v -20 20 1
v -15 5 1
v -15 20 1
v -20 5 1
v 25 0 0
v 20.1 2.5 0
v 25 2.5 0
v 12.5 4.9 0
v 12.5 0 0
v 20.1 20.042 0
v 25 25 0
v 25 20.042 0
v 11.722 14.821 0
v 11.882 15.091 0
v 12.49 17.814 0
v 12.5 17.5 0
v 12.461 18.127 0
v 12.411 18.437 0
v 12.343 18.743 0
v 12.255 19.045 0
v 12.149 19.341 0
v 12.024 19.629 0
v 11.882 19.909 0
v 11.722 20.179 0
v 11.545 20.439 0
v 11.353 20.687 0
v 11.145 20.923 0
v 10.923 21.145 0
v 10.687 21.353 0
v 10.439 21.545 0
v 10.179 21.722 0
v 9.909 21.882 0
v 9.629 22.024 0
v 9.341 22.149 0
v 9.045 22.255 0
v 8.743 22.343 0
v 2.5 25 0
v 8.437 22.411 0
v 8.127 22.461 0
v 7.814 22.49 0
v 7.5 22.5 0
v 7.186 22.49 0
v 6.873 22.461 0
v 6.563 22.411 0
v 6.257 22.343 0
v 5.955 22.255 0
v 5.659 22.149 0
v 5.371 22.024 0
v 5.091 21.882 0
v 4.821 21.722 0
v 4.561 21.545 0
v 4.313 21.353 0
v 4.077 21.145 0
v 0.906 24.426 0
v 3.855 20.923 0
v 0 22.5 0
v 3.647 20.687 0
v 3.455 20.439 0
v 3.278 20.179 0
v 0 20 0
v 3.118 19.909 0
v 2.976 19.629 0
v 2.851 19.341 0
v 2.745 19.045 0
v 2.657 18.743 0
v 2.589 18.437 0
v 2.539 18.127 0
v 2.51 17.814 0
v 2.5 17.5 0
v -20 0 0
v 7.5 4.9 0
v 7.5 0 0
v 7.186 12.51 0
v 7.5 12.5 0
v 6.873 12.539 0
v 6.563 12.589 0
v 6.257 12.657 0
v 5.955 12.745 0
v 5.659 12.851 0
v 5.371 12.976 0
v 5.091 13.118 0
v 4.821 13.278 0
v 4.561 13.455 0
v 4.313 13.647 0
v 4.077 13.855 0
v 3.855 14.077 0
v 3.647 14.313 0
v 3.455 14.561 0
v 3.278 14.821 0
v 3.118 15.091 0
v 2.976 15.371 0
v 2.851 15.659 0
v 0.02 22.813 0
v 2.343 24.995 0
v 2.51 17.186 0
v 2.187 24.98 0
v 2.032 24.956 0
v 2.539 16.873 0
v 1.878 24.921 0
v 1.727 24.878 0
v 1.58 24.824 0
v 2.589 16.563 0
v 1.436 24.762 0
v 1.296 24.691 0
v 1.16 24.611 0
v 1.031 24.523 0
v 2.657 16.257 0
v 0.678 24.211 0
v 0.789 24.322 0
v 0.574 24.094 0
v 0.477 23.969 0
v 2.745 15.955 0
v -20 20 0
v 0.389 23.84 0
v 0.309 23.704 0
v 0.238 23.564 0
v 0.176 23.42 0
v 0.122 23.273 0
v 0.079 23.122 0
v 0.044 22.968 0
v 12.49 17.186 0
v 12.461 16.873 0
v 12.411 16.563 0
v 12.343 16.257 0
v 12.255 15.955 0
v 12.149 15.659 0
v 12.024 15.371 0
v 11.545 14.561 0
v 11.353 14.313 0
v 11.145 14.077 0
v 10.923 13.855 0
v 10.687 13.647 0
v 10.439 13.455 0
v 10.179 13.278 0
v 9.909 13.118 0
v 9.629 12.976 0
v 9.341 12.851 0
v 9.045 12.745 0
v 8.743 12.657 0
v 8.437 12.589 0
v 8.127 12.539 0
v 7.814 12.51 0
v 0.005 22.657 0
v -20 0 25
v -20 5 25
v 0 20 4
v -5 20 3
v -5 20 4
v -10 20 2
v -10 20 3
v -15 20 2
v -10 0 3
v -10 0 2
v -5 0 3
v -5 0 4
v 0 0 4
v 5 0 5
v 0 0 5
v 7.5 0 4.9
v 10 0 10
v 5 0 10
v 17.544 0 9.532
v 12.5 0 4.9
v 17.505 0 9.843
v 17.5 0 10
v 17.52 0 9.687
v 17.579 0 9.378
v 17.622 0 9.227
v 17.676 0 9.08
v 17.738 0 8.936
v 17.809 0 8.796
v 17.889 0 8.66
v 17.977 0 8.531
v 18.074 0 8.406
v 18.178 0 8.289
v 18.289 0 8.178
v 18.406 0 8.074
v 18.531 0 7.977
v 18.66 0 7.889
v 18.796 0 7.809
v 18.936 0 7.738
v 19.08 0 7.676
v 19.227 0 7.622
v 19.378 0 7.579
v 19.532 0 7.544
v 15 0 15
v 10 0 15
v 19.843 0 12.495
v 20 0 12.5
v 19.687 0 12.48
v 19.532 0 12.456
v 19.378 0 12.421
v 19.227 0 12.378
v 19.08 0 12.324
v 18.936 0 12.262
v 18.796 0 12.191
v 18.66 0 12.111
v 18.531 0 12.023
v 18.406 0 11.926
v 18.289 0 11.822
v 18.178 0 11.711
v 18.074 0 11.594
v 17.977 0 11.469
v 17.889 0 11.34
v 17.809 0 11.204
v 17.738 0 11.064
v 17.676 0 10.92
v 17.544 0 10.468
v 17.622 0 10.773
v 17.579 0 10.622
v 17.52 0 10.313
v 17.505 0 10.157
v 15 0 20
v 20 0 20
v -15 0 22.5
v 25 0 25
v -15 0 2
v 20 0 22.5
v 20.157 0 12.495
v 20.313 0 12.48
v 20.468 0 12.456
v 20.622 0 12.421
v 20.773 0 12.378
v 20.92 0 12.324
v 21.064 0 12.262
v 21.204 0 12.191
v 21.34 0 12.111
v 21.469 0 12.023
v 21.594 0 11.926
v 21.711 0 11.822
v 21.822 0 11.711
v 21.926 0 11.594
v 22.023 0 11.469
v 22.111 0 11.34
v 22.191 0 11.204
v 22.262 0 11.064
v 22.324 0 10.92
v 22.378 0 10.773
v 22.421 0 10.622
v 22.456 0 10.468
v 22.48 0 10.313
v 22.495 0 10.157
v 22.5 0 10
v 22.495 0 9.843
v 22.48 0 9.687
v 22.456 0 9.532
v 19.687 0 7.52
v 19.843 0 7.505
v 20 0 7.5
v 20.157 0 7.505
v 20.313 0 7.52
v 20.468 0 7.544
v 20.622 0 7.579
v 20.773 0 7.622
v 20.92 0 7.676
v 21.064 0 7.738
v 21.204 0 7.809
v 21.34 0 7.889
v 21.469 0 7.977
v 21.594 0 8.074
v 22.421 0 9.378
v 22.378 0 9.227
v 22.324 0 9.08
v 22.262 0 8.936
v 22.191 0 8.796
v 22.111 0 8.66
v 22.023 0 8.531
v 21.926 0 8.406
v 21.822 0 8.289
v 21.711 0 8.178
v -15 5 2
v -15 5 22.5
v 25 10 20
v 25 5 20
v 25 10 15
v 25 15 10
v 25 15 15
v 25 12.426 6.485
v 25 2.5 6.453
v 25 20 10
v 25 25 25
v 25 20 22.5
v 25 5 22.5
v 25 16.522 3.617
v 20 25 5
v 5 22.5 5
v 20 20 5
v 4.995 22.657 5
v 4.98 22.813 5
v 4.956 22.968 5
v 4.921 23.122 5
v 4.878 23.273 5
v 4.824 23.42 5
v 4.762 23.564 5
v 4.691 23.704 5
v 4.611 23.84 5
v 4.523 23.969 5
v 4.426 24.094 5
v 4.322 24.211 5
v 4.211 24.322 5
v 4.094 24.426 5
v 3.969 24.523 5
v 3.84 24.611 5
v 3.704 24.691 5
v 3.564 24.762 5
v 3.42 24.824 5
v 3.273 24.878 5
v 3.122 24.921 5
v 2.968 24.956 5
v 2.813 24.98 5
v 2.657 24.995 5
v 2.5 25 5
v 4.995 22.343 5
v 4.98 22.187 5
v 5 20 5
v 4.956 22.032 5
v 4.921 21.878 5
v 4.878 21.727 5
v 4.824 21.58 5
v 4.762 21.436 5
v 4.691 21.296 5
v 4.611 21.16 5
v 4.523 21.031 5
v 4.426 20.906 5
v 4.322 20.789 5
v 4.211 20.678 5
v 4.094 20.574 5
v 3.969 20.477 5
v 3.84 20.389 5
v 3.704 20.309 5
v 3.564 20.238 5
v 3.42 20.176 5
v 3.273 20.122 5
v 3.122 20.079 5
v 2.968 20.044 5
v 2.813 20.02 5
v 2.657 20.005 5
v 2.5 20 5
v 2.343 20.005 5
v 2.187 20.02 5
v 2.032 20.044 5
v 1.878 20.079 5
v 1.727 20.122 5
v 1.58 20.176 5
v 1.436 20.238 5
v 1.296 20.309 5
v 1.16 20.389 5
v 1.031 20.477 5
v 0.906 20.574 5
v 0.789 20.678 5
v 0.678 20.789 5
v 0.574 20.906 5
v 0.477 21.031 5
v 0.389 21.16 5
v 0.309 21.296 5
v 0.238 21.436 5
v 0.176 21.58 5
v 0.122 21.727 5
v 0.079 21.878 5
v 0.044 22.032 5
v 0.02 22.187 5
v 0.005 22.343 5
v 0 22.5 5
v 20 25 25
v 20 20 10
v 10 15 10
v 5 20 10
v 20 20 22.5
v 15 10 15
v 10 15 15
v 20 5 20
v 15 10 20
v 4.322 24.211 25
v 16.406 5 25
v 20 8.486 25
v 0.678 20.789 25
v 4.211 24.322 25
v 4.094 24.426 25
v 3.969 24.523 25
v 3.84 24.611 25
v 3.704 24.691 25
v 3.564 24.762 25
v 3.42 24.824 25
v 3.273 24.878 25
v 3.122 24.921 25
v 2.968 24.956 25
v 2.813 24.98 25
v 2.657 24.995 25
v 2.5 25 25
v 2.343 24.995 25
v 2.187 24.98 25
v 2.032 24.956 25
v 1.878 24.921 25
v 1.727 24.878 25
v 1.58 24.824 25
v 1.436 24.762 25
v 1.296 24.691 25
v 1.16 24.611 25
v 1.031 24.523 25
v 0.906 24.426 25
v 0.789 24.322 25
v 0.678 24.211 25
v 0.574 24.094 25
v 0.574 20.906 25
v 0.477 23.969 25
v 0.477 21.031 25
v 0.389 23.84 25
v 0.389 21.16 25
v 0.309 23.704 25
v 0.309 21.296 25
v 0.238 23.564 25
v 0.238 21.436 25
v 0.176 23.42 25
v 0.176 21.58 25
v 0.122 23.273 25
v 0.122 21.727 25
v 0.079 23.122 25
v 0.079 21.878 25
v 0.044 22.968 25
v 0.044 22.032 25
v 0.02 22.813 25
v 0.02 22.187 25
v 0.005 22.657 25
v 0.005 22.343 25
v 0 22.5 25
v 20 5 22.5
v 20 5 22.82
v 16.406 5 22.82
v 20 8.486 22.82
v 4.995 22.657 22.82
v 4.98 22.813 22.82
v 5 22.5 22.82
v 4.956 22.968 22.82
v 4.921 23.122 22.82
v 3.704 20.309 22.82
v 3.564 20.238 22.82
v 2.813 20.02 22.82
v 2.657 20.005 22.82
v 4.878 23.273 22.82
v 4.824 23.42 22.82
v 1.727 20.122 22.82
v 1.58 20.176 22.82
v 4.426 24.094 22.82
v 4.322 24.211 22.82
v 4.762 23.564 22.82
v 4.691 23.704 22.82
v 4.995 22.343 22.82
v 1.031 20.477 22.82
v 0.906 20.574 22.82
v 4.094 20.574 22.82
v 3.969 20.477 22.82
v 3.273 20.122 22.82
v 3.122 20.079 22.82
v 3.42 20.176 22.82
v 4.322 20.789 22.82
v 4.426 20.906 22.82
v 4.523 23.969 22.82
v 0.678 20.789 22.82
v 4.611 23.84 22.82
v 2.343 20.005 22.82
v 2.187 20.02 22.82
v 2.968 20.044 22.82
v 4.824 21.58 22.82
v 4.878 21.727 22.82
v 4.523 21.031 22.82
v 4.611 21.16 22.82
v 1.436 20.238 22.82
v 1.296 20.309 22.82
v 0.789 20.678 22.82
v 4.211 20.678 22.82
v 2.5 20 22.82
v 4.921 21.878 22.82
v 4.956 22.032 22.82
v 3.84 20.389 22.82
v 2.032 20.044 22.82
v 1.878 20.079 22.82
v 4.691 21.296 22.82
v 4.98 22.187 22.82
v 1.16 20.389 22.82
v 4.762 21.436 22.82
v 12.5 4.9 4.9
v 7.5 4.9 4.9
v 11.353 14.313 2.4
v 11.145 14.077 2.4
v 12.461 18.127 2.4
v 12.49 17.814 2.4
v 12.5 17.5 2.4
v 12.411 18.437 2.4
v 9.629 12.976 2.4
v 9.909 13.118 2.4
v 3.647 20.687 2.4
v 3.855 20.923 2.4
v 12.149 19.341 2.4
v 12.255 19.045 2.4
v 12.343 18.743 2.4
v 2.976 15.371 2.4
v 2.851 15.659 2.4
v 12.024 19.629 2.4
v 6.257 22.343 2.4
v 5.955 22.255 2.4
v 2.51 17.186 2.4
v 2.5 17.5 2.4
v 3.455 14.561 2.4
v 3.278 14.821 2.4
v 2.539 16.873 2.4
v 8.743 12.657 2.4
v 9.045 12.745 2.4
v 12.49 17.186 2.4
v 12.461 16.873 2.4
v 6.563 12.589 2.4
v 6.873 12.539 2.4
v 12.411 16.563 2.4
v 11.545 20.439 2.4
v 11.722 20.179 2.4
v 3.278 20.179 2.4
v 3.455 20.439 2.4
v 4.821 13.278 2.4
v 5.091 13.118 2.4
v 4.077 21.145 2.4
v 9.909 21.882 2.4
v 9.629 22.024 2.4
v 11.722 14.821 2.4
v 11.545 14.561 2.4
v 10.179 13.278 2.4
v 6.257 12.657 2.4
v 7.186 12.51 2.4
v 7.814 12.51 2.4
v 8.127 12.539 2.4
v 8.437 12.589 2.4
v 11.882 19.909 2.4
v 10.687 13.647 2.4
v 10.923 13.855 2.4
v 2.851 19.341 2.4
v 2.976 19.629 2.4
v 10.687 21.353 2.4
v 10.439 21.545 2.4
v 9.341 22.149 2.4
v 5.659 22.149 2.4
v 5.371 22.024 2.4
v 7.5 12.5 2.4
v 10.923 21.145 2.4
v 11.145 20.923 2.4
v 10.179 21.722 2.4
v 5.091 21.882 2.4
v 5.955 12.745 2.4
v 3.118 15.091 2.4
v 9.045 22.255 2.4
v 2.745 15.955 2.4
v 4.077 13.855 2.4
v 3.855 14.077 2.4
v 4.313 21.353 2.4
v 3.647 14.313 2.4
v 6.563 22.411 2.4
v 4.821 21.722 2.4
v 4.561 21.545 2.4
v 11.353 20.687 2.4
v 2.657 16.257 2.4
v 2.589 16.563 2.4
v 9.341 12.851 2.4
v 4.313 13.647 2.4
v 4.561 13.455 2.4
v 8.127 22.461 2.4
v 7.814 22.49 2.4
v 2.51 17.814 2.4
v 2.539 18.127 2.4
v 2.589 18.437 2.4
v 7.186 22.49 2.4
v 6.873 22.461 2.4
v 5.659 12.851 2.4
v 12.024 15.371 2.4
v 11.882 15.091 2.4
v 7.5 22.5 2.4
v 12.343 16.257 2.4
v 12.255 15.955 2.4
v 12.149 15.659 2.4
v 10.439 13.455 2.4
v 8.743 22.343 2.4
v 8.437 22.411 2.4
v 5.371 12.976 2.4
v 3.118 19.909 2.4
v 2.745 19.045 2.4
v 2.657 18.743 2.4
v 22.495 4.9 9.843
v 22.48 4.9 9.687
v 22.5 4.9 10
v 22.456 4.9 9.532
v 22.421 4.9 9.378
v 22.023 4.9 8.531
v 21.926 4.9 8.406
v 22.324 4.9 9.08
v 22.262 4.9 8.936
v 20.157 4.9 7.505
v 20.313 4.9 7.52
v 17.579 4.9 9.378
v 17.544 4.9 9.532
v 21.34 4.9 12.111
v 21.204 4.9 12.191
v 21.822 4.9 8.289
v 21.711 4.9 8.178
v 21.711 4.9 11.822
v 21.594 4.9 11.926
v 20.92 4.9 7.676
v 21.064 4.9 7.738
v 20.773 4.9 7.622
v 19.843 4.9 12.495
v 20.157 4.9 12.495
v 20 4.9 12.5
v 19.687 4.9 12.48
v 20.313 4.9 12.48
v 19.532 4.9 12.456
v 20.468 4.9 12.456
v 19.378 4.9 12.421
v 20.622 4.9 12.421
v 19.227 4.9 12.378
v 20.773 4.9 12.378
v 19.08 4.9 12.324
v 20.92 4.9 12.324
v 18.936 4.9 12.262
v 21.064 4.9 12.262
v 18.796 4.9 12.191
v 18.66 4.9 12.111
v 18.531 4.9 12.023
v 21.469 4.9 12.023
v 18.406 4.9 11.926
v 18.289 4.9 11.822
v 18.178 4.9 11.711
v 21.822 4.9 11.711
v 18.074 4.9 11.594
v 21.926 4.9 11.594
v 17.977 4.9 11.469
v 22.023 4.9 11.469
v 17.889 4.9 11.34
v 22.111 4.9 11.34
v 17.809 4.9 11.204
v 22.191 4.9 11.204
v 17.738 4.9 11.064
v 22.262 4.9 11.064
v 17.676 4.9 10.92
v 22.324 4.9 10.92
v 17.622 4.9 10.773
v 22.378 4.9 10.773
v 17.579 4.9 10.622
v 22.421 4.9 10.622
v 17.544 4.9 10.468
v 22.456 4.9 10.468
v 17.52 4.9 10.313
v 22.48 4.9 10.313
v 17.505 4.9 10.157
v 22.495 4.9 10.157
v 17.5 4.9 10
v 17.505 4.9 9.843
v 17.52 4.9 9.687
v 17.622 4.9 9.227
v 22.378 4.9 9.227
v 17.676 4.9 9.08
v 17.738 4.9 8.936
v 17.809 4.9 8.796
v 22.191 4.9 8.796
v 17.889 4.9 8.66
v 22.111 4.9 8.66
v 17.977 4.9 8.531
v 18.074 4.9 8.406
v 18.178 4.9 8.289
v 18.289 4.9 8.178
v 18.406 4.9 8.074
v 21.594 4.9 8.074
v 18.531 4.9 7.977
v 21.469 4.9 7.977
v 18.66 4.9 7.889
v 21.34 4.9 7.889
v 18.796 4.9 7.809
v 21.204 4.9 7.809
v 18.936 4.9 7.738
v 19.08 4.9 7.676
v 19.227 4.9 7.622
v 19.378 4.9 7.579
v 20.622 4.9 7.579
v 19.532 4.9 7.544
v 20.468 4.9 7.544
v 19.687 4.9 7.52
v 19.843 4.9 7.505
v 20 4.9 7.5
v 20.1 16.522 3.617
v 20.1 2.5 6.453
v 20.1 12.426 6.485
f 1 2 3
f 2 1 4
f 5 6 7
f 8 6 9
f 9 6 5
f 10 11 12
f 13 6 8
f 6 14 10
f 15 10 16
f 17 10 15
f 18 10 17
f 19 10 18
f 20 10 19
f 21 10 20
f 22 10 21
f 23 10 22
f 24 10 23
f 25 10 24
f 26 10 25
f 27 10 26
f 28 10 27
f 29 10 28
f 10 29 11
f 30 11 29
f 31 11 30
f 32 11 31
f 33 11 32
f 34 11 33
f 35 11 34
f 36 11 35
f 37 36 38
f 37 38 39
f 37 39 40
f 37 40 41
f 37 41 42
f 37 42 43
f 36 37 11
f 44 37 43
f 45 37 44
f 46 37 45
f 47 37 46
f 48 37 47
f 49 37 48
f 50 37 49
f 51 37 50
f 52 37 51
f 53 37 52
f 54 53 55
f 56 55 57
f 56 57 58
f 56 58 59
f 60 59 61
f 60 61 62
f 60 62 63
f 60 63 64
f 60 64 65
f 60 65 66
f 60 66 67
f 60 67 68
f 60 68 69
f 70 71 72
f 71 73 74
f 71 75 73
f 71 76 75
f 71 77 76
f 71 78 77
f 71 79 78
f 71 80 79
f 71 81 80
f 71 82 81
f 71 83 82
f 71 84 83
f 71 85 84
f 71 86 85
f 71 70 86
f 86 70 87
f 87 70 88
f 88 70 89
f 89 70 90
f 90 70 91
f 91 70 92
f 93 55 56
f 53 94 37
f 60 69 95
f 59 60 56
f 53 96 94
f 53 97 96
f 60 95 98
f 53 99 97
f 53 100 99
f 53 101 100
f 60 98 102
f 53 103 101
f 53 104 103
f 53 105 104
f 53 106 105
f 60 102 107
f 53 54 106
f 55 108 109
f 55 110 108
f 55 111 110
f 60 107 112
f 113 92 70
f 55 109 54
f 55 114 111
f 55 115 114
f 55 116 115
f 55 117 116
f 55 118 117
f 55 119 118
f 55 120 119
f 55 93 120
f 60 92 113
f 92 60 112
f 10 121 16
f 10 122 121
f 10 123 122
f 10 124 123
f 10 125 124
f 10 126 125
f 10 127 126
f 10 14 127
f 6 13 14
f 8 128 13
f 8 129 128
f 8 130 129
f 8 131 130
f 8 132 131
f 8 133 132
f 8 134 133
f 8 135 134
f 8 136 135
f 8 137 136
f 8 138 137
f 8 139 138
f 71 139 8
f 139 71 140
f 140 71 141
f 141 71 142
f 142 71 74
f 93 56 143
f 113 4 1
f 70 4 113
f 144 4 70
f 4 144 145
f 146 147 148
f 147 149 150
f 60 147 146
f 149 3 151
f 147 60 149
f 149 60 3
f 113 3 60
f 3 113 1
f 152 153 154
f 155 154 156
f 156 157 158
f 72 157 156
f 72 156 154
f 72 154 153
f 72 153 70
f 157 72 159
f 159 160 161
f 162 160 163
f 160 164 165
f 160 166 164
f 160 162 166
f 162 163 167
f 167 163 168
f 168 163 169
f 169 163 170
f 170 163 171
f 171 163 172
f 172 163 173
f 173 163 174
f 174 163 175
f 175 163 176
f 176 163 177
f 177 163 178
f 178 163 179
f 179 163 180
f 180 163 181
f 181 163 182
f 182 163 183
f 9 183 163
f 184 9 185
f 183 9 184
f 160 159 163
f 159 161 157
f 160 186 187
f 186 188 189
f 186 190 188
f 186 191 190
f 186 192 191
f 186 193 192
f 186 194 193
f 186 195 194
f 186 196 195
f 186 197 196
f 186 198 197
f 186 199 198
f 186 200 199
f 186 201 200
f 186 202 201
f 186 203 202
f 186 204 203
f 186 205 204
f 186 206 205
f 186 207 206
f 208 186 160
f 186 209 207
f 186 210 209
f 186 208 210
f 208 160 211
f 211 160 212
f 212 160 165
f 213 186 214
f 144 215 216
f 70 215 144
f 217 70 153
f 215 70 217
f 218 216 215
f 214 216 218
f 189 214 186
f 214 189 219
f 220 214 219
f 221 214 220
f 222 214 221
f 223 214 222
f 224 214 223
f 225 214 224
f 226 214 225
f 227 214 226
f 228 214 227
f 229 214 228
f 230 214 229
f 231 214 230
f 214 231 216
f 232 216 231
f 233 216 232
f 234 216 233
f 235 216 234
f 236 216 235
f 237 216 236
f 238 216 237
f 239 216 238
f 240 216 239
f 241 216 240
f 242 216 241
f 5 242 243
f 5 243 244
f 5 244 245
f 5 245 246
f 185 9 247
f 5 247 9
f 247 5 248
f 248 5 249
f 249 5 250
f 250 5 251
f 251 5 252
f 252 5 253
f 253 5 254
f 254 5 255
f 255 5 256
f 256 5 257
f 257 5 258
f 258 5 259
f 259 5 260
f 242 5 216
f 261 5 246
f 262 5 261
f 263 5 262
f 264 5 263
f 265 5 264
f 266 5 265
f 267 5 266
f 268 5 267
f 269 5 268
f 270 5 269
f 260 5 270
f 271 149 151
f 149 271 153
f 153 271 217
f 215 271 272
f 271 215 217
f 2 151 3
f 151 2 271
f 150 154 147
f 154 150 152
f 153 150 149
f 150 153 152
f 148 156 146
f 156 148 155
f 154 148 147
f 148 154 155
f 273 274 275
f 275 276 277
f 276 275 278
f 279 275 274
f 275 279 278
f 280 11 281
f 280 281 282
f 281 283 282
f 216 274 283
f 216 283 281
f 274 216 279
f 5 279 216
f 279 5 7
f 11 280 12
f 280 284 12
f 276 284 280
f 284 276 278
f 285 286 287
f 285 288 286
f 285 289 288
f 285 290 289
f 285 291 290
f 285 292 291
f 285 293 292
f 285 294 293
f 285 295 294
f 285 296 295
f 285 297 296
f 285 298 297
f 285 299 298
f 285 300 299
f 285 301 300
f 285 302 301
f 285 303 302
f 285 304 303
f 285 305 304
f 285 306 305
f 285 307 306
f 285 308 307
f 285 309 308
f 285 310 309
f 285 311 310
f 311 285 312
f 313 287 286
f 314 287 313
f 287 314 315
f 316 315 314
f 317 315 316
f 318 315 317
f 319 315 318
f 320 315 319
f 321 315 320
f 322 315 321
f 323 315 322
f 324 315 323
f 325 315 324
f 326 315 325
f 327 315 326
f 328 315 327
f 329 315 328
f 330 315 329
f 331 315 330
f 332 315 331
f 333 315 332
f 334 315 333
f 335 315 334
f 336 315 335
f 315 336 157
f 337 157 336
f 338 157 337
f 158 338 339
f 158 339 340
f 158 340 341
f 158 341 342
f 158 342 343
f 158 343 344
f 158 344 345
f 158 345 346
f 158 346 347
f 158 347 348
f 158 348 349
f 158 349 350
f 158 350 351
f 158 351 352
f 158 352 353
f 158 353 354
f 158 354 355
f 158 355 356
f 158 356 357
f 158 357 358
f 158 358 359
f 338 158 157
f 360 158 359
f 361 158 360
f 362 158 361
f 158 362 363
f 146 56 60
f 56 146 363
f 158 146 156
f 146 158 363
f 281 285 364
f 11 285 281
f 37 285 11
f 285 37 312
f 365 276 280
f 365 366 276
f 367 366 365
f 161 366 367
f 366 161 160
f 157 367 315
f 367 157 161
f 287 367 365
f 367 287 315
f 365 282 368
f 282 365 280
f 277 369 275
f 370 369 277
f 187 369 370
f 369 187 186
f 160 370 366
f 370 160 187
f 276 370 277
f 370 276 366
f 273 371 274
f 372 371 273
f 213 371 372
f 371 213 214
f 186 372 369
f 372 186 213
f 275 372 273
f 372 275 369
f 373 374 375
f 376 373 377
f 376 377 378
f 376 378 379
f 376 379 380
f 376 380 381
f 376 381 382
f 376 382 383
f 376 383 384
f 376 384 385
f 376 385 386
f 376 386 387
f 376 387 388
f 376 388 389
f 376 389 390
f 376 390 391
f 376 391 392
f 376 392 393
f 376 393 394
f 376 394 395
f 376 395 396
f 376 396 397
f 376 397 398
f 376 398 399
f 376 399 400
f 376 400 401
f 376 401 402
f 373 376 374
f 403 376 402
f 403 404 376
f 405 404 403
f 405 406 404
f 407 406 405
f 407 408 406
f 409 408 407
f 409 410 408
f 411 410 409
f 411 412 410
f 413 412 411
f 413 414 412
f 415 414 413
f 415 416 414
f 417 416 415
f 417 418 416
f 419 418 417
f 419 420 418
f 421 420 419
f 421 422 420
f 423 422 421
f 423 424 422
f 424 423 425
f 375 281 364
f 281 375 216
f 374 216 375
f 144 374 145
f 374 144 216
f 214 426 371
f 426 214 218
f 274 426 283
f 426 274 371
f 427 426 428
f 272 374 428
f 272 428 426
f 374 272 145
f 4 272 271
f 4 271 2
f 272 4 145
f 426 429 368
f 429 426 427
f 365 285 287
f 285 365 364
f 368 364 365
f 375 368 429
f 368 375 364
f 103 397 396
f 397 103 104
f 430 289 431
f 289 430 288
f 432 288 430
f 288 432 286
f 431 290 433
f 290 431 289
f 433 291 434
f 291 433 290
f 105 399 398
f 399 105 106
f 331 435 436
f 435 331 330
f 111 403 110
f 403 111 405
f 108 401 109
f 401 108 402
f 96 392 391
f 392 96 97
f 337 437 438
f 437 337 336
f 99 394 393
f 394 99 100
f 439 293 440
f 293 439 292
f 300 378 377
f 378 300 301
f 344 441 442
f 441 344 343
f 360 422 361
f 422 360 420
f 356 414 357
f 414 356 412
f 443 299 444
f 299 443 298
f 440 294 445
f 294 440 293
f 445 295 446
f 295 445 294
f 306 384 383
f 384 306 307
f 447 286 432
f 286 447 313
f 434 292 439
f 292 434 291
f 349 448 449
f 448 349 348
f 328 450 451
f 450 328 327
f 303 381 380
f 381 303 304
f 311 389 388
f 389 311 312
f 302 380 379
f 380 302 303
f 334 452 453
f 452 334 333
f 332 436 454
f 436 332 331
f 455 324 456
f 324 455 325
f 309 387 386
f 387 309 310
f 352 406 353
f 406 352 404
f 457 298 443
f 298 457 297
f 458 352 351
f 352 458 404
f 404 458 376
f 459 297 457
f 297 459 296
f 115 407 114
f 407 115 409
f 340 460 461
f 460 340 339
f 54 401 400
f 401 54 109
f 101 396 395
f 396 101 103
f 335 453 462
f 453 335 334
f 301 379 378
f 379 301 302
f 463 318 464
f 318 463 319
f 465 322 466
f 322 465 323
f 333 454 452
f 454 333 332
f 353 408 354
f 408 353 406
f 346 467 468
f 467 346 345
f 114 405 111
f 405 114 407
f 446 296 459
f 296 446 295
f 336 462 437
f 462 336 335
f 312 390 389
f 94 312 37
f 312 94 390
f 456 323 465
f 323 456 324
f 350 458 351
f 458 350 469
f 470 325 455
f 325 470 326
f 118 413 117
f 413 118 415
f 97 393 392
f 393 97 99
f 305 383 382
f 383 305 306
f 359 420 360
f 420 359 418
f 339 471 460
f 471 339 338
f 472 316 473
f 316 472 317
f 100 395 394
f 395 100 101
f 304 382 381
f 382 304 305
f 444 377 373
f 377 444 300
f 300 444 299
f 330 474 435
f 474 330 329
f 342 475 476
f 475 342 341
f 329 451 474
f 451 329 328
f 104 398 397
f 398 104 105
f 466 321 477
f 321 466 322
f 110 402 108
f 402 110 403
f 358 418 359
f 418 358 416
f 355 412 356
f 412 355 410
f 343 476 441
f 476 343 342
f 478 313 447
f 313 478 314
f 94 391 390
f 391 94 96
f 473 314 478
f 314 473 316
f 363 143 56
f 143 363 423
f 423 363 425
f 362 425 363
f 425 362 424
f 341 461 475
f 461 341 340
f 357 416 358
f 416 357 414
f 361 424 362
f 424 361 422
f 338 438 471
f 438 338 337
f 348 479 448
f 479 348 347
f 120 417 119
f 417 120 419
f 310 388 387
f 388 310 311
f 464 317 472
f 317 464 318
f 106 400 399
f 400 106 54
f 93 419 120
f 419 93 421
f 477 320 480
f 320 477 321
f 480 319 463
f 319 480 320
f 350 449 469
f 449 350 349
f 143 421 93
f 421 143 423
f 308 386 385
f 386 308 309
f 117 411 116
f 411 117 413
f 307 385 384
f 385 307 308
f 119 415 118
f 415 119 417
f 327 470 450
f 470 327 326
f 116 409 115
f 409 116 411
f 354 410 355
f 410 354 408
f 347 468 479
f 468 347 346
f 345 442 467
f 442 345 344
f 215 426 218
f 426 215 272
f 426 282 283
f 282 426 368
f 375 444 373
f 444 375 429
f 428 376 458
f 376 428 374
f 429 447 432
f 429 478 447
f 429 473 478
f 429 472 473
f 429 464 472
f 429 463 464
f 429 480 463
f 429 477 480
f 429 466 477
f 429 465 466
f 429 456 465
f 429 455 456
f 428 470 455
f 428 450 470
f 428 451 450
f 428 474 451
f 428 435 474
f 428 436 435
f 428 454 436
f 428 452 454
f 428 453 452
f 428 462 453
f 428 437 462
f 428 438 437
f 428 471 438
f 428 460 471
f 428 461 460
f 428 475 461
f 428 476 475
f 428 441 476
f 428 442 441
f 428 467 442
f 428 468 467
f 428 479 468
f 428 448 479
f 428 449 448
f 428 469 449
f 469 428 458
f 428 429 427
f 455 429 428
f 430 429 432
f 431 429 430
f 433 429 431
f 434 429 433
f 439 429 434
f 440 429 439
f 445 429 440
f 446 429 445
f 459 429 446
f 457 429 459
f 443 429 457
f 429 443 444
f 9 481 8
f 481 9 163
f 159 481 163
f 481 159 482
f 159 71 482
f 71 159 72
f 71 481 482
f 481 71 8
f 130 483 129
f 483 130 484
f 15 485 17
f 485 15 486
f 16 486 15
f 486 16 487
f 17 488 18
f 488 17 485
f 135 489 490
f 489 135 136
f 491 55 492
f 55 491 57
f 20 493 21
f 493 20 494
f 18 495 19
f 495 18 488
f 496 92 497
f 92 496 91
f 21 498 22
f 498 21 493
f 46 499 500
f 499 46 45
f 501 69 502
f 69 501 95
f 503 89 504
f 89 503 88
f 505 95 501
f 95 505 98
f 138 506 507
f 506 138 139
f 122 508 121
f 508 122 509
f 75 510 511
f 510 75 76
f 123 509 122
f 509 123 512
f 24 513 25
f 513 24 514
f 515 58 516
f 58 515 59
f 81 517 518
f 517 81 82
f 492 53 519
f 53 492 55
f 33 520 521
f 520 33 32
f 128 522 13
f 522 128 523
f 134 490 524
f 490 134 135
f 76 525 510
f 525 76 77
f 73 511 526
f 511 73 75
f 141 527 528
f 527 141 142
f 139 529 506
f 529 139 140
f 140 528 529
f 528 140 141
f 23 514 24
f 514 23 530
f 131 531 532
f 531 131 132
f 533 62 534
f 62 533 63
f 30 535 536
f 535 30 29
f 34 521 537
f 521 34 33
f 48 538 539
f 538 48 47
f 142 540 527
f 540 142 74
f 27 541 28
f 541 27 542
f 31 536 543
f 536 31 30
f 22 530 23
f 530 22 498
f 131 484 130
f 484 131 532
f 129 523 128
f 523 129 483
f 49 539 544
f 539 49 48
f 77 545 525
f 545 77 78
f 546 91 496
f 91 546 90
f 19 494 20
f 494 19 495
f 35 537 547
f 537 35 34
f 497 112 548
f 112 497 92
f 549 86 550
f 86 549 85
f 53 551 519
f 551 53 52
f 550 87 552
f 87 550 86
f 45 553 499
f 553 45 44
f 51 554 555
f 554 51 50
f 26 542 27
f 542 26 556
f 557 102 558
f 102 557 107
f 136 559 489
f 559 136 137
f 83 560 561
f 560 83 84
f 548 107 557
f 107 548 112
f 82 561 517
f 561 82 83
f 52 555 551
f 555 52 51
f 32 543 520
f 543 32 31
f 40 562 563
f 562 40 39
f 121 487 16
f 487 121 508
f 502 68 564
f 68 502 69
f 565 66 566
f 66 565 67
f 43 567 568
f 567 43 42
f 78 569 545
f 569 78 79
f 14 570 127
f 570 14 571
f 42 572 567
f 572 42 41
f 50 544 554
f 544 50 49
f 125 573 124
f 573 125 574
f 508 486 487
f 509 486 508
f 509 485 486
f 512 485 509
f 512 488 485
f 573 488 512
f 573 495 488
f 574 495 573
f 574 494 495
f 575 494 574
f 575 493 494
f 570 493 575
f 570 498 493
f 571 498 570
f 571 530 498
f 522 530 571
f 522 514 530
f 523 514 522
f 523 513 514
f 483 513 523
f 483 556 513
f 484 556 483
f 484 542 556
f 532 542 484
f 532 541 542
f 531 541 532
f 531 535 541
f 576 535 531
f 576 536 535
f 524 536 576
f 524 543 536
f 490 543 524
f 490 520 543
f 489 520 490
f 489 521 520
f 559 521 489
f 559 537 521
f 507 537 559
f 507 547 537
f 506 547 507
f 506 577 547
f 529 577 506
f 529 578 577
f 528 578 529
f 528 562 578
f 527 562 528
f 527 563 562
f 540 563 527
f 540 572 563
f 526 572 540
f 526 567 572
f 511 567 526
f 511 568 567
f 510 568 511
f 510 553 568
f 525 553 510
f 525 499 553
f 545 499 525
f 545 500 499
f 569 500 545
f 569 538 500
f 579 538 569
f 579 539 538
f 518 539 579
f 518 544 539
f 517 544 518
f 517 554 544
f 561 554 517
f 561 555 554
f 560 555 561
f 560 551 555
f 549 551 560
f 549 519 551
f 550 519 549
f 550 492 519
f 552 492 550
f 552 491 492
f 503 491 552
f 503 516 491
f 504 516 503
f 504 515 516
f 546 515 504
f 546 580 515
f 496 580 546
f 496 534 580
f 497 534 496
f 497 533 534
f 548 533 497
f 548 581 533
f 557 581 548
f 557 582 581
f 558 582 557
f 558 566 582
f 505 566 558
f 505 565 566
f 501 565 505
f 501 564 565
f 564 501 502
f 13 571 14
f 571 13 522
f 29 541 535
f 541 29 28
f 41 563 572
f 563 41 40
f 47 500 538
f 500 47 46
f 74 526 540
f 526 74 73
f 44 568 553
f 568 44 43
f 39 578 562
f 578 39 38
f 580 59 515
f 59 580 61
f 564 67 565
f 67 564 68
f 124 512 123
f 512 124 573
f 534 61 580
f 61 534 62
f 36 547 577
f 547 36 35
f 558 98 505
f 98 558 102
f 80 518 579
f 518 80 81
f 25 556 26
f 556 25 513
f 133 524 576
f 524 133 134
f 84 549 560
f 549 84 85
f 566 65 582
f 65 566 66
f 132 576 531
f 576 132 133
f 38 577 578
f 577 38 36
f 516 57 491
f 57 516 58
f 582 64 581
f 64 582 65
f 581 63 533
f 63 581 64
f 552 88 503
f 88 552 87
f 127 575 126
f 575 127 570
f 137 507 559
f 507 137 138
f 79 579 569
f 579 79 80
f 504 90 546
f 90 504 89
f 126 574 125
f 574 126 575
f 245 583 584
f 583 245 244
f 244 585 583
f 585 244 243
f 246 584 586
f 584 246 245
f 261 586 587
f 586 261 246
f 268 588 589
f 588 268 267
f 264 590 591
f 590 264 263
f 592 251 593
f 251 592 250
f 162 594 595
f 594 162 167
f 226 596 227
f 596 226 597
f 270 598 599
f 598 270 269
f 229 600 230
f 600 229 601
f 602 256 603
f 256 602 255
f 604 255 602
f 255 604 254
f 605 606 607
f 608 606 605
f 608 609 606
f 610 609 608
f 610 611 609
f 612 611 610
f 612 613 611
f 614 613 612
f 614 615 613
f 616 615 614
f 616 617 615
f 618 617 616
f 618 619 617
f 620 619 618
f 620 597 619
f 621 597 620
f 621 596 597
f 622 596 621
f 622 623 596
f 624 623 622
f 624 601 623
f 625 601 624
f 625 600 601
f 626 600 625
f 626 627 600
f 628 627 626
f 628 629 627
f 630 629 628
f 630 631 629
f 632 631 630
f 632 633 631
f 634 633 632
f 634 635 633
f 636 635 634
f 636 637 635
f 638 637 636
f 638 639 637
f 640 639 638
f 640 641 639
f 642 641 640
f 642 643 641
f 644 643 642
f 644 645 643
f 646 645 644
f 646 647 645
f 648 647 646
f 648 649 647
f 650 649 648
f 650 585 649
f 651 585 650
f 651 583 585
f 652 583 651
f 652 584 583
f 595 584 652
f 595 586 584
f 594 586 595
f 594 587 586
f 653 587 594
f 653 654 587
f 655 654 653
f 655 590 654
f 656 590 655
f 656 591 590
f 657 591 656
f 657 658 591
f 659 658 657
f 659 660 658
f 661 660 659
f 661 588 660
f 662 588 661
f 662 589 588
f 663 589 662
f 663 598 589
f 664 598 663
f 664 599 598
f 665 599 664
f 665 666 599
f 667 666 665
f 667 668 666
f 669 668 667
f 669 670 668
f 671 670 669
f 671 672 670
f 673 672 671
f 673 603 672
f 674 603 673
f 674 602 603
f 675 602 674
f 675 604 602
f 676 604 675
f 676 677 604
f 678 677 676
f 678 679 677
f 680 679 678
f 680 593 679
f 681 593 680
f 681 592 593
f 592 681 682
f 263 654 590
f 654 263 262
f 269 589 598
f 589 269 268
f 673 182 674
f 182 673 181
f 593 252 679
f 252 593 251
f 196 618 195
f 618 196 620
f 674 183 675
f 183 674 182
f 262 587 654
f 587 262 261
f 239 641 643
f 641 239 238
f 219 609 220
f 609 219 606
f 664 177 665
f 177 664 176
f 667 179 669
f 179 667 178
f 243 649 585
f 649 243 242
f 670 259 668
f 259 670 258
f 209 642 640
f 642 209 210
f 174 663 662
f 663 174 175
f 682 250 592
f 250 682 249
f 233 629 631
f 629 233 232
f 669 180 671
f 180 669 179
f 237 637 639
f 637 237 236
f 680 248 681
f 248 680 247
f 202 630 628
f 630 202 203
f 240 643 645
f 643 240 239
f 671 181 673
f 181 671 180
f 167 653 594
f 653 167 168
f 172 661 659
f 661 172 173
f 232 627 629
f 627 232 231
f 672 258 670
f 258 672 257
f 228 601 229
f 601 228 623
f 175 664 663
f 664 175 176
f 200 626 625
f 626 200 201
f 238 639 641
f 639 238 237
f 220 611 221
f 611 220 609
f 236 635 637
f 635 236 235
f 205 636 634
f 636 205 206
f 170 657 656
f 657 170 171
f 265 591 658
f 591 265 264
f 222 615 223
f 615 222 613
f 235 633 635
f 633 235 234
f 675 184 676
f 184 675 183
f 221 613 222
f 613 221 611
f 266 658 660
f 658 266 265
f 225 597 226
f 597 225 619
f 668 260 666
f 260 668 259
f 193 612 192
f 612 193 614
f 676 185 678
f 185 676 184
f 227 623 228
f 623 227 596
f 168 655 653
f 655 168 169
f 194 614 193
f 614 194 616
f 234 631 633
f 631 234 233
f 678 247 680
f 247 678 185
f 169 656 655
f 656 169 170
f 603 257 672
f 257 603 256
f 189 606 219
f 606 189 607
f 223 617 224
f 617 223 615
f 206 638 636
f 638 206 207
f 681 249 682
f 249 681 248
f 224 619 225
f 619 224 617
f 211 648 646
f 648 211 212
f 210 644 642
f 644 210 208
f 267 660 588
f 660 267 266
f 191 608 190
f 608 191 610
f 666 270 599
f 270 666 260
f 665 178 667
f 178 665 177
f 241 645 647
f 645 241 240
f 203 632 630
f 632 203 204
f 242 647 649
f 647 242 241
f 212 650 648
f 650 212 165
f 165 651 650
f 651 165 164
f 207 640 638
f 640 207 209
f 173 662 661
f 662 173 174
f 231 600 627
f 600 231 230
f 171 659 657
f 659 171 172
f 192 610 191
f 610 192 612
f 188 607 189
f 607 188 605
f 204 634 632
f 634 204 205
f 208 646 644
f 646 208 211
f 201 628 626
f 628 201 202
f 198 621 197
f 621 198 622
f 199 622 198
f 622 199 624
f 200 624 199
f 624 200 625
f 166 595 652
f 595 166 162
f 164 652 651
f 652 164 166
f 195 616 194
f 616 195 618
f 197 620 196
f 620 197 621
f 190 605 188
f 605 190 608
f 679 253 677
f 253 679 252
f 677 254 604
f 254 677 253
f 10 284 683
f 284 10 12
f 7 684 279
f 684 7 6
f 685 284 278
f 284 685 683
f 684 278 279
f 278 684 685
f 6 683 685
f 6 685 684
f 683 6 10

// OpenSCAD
$fn=100;

size=25;
numsteps=5;
step=size/numsteps;
line_height=0.32;
echo(step);

step_cube();

module step_cube(){
    difference(){
        union(){
            //steps
            for(i=[1:numsteps-1]){
                translate([-size+step*i,0,0])
                cube([size,size-step,i]);
            }
    
            difference(){
            for(i=[0:numsteps-1]){
                translate([step*i,0,0]) cube([size-step*i,size-step*i,step*(i+1)]);
            }
            
        translate([-step/2,size-step,-.1]) rotate([0,0,45]) 
        cube([step*2,step,step+1]);
            }
        
            // polls
            translate([-size+step,0,0])
            cube([step,step,size]);
            translate([size-step,size-step,0]) cube([step,step,size]);
            translate([step/2,size-step/2,0]) cylinder(d=step, h=size);
            
            // bridges
            translate([-size+step,0,size-step/2]) cube([size*2-step,step,step/2]);
            translate([size-step,0,size-step/2]) cube([step,size,step/2]);
            hull(){
                translate([size-step+1.4,0,size-step/2+line_height]) 
                rotate([0,0,45])
                cube([step,step,step/2-line_height]);

                translate([step/2,size-step/2,size-step/2+line_height]) 
                cylinder(d=step, h=step/2-line_height);
            }
        }

        
        // bridge
        translate([step*1.5,-.1,-.1]) cube([step,step,step]);
        
        // cylinder
        translate([step*1.5,size-(step*1.5),-.1]) cylinder(d=step*2, h=step/2);
        // vertical cylinder
        translate([size-step,-.1,step*2]) rotate([-90,0,0]) cylinder(d=step, h=step);
        
        // Angle test
        hull(){
            // 45deg
            translate([size-step+.1,size-step,-.1])
            rotate([45,0,0]) 
            cube([step,.1,step]);   
            
            /* 55deg */
            translate([size-step+.1, size-step-sin(45)*step,cos(45)*step]) 
            rotate([55,0,0]) 
            cube([step,.1,step]);
            
            /* 90deg */
            translate([size-step+.1,step/2,-.1]) 
            cube([step,.1,cos(45)*step+cos(55)*step+.15]);
            /**/
        }
    }
}
